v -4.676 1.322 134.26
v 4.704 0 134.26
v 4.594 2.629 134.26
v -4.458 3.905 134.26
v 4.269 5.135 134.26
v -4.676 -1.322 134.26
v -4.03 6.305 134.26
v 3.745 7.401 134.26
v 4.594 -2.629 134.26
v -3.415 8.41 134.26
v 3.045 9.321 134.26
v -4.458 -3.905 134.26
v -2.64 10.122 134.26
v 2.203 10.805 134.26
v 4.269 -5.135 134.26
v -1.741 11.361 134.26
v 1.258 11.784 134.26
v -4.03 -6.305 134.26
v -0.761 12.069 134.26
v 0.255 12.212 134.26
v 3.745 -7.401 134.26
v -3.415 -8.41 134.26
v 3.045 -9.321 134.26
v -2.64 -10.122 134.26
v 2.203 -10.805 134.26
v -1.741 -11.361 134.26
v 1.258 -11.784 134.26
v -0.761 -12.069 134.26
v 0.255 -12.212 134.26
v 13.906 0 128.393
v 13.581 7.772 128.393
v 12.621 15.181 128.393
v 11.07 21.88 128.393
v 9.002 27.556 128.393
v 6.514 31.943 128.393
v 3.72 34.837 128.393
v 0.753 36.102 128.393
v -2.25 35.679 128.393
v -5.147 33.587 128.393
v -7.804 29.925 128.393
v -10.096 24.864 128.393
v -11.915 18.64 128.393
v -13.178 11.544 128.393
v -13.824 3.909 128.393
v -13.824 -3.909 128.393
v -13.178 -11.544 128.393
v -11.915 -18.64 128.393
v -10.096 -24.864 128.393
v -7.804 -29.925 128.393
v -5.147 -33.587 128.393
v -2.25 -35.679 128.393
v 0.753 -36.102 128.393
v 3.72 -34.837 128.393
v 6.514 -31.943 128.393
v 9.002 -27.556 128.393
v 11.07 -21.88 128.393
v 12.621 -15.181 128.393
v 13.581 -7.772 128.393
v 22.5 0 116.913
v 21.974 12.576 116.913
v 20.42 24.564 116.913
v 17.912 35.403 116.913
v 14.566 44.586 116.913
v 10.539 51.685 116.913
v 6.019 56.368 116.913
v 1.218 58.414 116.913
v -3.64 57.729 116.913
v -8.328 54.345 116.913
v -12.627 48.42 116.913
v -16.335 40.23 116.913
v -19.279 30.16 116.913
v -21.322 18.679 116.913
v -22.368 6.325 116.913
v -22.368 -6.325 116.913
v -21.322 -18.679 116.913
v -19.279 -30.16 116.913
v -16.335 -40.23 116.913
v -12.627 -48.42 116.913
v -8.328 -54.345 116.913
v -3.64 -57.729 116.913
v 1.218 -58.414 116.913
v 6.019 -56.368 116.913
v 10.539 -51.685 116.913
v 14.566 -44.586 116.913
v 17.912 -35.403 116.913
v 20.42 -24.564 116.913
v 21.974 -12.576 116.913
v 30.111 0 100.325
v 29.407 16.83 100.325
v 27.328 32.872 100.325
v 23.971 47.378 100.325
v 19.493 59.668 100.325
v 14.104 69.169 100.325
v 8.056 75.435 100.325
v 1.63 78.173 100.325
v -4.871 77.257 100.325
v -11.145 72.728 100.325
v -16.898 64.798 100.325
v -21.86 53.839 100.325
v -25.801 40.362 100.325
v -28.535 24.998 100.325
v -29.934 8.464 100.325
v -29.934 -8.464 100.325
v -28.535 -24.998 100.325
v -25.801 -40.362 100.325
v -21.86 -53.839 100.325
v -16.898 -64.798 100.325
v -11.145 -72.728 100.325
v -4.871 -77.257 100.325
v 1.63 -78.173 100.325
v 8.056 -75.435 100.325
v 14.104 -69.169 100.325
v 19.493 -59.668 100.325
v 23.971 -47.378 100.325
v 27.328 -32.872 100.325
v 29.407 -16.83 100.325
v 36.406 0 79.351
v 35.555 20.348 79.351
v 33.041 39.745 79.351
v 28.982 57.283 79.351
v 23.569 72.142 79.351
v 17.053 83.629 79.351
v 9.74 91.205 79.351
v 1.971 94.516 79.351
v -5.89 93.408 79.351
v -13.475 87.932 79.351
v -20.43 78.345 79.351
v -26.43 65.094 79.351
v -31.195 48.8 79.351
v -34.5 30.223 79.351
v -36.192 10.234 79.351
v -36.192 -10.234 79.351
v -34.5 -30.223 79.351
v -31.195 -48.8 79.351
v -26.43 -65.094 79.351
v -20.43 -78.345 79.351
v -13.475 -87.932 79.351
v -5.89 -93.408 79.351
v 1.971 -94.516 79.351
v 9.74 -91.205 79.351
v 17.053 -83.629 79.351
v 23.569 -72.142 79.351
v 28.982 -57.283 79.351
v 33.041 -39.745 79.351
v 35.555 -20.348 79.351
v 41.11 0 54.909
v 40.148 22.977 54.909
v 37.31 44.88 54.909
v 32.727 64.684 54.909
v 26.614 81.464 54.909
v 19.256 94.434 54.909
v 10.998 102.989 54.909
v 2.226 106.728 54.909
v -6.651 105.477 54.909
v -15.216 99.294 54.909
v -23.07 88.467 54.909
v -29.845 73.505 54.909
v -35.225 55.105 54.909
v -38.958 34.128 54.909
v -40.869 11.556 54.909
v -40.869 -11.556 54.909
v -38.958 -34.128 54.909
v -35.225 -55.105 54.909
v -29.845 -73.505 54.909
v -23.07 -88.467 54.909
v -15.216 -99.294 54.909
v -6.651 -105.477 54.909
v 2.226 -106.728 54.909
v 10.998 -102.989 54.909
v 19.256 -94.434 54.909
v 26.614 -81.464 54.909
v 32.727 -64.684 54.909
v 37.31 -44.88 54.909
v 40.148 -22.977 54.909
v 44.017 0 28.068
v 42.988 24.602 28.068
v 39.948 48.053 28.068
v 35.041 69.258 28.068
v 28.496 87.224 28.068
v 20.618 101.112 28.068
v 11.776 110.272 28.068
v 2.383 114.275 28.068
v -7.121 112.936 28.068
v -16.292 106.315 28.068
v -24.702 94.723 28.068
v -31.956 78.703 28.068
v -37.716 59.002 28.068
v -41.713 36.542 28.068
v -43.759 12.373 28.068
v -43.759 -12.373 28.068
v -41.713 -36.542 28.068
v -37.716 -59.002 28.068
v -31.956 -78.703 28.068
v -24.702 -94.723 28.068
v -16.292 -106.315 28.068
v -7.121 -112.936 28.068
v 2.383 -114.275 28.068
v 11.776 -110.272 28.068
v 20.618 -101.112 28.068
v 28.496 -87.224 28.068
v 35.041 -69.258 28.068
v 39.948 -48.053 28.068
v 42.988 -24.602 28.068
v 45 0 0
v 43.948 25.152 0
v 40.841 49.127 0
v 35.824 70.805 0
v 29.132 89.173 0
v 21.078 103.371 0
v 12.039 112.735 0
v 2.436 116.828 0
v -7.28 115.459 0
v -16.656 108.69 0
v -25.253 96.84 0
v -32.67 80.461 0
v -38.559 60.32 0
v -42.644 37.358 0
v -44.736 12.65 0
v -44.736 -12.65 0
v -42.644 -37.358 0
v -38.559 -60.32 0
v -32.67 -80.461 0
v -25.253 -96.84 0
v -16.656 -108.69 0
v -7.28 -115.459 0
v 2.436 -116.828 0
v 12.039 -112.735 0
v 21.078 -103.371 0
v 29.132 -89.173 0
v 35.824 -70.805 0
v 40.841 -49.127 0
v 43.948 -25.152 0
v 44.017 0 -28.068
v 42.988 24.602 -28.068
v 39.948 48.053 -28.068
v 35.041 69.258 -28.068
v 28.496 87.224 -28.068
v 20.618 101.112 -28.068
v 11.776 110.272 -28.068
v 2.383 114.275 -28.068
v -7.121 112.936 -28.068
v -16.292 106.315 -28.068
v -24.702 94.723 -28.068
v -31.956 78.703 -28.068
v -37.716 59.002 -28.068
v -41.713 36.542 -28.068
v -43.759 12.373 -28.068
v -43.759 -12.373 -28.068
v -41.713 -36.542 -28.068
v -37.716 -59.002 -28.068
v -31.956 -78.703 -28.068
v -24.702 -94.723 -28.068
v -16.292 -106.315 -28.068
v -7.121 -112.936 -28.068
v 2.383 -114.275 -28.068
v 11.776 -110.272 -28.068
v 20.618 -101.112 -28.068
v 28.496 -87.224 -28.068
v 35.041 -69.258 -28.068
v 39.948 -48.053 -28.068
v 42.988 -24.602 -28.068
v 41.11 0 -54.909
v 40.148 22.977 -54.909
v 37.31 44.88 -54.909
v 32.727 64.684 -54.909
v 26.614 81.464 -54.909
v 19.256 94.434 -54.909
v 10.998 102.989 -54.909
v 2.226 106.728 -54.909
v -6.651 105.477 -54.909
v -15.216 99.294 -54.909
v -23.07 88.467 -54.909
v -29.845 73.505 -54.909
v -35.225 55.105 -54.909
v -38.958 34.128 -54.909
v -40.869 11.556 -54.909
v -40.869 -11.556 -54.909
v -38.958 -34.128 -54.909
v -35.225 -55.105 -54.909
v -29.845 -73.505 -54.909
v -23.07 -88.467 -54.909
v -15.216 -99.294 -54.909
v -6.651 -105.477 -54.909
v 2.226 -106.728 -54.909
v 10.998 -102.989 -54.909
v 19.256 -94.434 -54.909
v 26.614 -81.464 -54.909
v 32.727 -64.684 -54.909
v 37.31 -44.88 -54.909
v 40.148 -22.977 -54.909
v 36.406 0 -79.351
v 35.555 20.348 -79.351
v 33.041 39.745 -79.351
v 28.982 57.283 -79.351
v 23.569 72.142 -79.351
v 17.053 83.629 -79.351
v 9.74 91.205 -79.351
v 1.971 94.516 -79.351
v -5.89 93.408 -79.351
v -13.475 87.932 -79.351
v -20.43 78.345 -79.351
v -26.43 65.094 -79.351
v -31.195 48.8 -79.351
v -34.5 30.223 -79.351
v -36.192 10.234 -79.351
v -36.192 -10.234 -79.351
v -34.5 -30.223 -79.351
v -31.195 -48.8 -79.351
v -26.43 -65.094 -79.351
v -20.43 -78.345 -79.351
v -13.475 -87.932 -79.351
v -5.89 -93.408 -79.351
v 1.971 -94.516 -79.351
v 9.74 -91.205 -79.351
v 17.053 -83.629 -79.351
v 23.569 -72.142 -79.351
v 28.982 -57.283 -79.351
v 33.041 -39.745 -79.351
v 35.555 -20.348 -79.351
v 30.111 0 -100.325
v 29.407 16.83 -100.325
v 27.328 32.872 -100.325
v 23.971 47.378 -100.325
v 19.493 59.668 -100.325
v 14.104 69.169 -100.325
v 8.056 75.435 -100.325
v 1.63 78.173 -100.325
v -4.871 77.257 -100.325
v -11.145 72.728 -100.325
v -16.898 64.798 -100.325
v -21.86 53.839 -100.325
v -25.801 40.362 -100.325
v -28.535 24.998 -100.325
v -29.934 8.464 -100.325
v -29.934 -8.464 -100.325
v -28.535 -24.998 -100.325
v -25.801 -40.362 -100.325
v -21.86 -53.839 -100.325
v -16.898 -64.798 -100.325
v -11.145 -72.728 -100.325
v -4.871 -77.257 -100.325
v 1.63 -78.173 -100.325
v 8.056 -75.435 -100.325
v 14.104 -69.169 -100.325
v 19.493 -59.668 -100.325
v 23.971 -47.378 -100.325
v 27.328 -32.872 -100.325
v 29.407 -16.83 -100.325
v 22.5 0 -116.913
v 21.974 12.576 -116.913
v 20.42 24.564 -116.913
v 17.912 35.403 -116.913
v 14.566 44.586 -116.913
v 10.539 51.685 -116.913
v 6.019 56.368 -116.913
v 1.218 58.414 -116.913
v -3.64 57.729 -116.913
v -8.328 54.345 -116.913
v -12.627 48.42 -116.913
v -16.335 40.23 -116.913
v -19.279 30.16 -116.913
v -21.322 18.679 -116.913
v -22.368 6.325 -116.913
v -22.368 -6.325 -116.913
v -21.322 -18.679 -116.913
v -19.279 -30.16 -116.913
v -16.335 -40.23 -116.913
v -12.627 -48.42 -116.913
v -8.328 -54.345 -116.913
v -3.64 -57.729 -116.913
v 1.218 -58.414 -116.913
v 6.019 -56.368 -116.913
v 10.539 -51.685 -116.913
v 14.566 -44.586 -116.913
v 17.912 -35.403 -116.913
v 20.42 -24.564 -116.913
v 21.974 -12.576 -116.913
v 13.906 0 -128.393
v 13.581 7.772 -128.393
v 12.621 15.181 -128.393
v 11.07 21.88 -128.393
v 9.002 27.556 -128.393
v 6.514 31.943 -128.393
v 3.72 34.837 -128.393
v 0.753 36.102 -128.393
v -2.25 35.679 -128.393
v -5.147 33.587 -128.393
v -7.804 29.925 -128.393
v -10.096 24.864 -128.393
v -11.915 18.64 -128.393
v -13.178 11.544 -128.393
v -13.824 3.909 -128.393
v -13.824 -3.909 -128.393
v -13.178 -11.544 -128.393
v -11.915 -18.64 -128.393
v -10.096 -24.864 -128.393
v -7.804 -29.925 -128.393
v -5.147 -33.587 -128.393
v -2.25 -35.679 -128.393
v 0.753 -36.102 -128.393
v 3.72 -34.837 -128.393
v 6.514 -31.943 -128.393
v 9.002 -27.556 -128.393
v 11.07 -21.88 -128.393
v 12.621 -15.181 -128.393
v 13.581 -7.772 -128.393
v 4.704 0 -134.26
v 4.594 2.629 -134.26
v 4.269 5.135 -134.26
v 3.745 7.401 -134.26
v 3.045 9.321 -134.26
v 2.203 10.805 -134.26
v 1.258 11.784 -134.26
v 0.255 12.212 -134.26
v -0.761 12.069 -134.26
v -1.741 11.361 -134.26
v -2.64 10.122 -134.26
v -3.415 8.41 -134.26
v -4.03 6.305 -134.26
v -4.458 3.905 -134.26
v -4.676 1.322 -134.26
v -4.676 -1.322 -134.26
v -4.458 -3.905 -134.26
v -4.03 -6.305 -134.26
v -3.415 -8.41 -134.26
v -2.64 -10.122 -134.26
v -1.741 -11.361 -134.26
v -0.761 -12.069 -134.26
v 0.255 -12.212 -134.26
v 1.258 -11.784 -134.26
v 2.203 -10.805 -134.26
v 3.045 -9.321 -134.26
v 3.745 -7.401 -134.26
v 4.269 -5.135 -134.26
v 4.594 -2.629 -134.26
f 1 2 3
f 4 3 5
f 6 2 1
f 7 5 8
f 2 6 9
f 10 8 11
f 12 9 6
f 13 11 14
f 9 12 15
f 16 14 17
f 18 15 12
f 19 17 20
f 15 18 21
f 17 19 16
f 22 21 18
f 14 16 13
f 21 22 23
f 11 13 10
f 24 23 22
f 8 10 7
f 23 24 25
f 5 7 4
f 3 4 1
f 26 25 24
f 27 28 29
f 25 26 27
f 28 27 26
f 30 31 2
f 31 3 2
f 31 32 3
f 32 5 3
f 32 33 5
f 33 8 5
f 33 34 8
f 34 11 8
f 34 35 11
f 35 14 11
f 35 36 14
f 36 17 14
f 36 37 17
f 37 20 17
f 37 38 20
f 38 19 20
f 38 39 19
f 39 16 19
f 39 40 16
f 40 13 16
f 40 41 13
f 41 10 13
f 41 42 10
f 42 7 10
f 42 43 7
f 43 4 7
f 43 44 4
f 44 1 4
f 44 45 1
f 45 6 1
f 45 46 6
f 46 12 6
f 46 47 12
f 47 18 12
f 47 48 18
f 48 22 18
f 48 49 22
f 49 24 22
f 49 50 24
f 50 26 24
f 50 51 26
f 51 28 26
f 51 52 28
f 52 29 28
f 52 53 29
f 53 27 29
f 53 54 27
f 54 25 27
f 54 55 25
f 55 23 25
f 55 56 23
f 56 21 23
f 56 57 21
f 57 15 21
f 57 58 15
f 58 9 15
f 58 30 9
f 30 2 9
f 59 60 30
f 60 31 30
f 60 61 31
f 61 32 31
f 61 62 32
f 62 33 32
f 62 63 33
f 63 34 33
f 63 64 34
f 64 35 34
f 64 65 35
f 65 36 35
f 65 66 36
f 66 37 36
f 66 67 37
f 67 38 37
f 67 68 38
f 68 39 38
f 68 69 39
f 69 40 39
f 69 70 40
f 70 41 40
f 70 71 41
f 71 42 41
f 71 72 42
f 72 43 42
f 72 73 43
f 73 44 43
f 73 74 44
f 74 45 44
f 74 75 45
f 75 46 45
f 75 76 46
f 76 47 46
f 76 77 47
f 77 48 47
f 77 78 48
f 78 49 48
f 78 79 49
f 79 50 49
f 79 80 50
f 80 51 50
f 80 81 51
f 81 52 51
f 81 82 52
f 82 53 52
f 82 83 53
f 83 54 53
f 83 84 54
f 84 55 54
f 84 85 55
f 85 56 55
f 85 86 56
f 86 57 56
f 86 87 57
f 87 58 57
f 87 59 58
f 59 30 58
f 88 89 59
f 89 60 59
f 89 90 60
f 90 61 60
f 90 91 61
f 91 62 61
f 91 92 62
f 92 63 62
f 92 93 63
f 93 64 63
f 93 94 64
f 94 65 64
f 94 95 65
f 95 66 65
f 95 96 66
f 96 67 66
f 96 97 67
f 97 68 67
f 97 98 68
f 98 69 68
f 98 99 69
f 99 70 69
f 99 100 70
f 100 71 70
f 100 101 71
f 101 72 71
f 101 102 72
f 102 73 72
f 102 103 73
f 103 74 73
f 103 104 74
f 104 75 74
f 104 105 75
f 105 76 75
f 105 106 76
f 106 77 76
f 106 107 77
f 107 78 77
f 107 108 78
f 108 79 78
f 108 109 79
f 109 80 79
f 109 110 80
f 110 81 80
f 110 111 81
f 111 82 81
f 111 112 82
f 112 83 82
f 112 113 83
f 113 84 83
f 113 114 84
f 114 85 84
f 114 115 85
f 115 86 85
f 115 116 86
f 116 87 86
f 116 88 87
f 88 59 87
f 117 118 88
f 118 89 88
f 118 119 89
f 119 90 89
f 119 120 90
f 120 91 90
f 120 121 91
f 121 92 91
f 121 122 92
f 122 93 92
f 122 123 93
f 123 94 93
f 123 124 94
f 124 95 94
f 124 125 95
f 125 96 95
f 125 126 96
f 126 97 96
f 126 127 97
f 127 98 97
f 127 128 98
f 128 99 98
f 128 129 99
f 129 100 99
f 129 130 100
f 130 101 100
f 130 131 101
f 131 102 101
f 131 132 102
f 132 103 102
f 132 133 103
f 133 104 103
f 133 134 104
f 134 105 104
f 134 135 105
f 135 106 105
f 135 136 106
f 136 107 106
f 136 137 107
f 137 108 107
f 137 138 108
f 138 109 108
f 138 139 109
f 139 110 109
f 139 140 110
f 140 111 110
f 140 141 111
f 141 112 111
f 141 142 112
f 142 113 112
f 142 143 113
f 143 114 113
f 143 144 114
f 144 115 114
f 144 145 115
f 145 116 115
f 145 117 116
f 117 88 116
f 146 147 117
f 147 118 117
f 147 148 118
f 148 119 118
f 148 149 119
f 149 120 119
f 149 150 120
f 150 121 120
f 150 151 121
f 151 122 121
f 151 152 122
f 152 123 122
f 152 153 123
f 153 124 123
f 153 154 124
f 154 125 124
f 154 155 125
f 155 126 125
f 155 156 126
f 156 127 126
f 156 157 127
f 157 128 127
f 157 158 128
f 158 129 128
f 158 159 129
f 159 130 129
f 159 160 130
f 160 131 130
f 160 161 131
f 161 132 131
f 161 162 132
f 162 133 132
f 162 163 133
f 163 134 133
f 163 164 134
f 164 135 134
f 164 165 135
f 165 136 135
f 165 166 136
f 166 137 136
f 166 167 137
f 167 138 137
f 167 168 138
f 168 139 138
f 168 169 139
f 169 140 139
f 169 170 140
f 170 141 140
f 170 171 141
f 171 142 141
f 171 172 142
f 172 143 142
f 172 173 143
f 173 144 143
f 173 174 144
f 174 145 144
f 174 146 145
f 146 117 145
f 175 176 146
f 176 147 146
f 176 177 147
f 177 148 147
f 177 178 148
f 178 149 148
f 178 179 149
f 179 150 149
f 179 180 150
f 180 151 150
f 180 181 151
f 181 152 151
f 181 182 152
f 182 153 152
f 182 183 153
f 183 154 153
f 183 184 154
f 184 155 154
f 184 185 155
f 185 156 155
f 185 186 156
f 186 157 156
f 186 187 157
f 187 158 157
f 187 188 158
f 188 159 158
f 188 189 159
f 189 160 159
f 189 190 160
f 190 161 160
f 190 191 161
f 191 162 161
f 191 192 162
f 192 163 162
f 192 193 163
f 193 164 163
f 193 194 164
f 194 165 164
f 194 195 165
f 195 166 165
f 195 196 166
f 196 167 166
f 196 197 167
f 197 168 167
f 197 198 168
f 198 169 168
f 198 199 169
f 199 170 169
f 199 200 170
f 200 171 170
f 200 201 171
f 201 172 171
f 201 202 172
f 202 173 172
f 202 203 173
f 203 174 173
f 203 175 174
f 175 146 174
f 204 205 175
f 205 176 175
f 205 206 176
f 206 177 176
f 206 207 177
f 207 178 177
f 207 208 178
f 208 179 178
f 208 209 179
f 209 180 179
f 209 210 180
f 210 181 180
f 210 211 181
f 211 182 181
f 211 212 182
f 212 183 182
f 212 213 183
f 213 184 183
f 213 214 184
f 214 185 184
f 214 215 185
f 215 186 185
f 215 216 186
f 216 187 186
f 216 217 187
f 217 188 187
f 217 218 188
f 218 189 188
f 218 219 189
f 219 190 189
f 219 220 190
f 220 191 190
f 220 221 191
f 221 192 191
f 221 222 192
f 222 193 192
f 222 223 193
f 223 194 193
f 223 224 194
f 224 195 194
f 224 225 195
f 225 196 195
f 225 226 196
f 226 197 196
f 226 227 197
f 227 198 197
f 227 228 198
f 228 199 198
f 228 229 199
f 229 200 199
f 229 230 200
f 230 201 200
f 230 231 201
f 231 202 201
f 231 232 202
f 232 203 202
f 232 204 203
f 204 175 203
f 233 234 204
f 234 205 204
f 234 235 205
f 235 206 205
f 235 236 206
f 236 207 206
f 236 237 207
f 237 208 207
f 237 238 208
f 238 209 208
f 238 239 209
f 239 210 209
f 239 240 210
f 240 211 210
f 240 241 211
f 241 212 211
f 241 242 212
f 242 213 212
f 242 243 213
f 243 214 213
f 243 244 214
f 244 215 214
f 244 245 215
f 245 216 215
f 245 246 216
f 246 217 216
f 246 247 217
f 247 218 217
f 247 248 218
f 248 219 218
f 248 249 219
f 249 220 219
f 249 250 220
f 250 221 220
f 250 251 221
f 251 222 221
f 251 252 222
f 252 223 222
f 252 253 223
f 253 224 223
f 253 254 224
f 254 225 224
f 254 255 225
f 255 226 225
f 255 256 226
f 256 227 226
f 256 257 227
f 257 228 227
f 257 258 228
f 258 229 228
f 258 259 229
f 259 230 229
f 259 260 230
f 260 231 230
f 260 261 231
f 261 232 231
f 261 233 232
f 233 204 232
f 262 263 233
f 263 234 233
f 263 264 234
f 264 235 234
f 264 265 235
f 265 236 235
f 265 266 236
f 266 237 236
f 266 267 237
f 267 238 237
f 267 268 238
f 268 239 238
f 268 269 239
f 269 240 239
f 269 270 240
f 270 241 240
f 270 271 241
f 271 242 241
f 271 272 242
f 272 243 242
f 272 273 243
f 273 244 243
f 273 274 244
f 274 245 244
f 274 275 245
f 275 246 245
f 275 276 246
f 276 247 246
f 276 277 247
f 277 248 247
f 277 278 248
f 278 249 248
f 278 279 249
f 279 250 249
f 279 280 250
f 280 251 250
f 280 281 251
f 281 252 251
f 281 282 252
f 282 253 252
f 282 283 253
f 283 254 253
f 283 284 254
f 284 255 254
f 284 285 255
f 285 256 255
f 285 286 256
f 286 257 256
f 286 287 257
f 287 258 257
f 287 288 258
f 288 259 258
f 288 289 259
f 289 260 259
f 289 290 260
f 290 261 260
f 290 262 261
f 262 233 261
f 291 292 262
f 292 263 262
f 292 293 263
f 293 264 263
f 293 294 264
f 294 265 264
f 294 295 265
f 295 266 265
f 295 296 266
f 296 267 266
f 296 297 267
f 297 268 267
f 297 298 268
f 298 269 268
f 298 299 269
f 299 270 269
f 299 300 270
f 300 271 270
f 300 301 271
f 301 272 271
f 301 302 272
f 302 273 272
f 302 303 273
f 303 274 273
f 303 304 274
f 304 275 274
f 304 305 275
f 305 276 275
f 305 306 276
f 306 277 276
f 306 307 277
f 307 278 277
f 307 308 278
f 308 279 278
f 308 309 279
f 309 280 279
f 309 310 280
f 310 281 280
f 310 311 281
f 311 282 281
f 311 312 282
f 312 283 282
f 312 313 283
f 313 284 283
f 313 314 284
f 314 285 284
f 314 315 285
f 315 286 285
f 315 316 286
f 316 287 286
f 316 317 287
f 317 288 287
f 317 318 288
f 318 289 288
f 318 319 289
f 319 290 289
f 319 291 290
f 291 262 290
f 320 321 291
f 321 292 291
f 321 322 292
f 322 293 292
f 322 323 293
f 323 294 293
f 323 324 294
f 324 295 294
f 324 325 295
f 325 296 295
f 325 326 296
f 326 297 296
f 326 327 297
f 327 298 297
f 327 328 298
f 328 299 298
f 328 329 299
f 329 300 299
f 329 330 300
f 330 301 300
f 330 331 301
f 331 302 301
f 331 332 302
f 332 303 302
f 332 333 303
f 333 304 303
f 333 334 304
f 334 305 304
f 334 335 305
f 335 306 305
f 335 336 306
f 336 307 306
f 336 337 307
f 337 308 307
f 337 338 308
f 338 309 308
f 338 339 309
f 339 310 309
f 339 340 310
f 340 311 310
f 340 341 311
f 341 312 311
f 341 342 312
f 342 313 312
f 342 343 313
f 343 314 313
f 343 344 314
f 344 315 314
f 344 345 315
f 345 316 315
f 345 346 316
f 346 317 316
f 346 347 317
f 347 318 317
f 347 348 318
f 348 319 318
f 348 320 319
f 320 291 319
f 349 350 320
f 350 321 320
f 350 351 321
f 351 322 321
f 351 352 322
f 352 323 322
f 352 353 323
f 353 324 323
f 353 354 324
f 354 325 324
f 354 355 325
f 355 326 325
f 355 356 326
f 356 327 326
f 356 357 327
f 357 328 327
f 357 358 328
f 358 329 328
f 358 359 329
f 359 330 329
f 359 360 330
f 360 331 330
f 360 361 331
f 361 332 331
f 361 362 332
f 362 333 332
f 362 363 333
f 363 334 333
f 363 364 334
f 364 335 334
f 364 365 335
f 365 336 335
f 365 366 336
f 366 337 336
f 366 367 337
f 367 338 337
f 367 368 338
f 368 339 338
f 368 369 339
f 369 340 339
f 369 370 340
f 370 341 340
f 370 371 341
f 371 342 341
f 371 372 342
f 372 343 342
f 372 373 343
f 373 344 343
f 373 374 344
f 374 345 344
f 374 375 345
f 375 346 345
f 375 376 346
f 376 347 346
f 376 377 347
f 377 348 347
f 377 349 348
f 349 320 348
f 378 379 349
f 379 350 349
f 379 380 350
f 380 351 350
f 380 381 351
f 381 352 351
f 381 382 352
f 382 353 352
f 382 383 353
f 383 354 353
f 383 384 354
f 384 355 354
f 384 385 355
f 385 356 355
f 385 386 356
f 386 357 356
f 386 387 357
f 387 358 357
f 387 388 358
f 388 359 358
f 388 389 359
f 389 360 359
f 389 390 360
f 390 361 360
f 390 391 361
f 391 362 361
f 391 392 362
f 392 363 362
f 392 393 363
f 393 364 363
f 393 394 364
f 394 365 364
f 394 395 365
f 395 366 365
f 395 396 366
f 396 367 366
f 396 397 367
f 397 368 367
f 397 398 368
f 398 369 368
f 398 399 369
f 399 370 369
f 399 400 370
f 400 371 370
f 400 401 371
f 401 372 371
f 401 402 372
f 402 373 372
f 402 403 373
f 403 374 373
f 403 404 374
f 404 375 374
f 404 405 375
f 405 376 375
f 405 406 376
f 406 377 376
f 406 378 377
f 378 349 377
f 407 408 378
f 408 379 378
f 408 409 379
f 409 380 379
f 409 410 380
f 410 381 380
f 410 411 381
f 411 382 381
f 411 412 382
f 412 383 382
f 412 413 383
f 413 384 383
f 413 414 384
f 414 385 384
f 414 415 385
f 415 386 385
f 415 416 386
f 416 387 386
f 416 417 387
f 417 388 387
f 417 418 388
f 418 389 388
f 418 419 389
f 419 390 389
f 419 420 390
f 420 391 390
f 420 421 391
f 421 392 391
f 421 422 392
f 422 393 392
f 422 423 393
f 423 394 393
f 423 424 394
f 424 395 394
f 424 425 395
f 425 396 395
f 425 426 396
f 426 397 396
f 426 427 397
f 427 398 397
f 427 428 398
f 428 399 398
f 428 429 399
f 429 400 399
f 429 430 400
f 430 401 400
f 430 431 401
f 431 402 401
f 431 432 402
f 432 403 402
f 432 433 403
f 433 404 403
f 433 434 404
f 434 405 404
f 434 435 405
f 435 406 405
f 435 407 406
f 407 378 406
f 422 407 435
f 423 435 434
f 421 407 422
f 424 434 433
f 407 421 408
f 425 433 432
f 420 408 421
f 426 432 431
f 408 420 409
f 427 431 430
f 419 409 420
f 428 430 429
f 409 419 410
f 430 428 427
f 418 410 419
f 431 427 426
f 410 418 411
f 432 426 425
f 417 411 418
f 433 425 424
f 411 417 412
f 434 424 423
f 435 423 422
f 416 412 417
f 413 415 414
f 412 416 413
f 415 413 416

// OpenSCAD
// Generated by SolidPython 1.0.1 on 2020-07-29 00:46:46


scale(v = [5, 13, 15]) {
	sphere(r = 9);
}
/***********************************************
*********      SolidPython code:      **********
************************************************
 
# import packages: SolidPython
from solid import *
from solid.utils import *
from itertools import chain, combinations, permutations


class Resize:

    def __init__(self, scad_file):
        self.scad_file = scad_file
        #self.scad_file = import_scad(scad_file)
        # cone/cylinder param:
        self.r1 = 0
        self.r2 = 0
        self.h = 0
        # rectangular prism param:
        self.w = 0
        self.l = 0
        # ellipse param:
        self.r = 0

    # import OpenScad code (file name corresponds to shape)


    # classify shape + parameters
    def assign(self, param1, param2, param3):
        if self.scad_file == 'cone.scad':
            self.r1 = param1
            self.r2 = param2
            self.h = param3
        elif self.scad_file == 'cylinder.scad':
            self.r1 = param1
            self.r2 = param2
            self.h = param3
        elif self.scad_file == 'rectangularPrism.scad':
            self.h = param1
            self.l = param2
            self.w = param3
        else:
            self.r = param1
            self.h = param2

    # resize parameters
    def iterate(self):
        x = range(3, 20, 2)
        i = 1
        if self.scad_file == 'cone.scad':
            tempList = list(permutations(x, 2))
            for temp in tempList:
                param1 = temp[0]
                param2 = temp[1]
                filepath = 'produced_scad_files/' + 'cone' + str(param1) + '_' + str(param2) + '_' + '.scad'
                scad_render_to_file(cylinder(h=param1, r1=param2, r2=0), filepath)

        elif self.scad_file == 'cylinder.scad':
            tempList = list(permutations(x, 3))
            for temp in tempList:
                param1 = temp[0]
                param2 = temp[1]
                filepath = 'produced_scad_files/' + 'cylinder' + str(param1) + '_' + str(param2) + '_' + '.scad'
                scad_render_to_file(cylinder(h=param1, r1=param2, r2=param2), filepath)

        elif self.scad_file == 'rectangularPrism.scad':
            tempList = list(permutations(x, 3))
            for temp in tempList:
                param1 = temp[0]
                param2 = temp[1]
                param3 = temp[2]
                filepath = 'produced_scad_files/' + 'rectangularPrism' + str(param1) + '_' + str(param2) + '_' + str(
                    param3) + '.scad'
                scad_render_to_file(cube(size=(param1, param2, param3)), filepath)

        elif self.scad_file == 'ellipse.scad':
            tempList = list(permutations(x, 4))
            for temp in tempList:
                param1 = temp[0]
                param2 = temp[1]
                param3 = temp[2]
                param4 = temp[3]
                filepath = 'produced_scad_files/' + 'ellipse' + str(param1) + '_' + str(param2) + '_' + str(param3) + '_' + str(param4) + '.scad'
                scad_render_to_file(scale([param1, param2, param3])(sphere(r=param4)), filepath)

    def render_to_scadfile(self):
        scad_render_to_file(scad, 'example.scad') 
 
************************************************/
